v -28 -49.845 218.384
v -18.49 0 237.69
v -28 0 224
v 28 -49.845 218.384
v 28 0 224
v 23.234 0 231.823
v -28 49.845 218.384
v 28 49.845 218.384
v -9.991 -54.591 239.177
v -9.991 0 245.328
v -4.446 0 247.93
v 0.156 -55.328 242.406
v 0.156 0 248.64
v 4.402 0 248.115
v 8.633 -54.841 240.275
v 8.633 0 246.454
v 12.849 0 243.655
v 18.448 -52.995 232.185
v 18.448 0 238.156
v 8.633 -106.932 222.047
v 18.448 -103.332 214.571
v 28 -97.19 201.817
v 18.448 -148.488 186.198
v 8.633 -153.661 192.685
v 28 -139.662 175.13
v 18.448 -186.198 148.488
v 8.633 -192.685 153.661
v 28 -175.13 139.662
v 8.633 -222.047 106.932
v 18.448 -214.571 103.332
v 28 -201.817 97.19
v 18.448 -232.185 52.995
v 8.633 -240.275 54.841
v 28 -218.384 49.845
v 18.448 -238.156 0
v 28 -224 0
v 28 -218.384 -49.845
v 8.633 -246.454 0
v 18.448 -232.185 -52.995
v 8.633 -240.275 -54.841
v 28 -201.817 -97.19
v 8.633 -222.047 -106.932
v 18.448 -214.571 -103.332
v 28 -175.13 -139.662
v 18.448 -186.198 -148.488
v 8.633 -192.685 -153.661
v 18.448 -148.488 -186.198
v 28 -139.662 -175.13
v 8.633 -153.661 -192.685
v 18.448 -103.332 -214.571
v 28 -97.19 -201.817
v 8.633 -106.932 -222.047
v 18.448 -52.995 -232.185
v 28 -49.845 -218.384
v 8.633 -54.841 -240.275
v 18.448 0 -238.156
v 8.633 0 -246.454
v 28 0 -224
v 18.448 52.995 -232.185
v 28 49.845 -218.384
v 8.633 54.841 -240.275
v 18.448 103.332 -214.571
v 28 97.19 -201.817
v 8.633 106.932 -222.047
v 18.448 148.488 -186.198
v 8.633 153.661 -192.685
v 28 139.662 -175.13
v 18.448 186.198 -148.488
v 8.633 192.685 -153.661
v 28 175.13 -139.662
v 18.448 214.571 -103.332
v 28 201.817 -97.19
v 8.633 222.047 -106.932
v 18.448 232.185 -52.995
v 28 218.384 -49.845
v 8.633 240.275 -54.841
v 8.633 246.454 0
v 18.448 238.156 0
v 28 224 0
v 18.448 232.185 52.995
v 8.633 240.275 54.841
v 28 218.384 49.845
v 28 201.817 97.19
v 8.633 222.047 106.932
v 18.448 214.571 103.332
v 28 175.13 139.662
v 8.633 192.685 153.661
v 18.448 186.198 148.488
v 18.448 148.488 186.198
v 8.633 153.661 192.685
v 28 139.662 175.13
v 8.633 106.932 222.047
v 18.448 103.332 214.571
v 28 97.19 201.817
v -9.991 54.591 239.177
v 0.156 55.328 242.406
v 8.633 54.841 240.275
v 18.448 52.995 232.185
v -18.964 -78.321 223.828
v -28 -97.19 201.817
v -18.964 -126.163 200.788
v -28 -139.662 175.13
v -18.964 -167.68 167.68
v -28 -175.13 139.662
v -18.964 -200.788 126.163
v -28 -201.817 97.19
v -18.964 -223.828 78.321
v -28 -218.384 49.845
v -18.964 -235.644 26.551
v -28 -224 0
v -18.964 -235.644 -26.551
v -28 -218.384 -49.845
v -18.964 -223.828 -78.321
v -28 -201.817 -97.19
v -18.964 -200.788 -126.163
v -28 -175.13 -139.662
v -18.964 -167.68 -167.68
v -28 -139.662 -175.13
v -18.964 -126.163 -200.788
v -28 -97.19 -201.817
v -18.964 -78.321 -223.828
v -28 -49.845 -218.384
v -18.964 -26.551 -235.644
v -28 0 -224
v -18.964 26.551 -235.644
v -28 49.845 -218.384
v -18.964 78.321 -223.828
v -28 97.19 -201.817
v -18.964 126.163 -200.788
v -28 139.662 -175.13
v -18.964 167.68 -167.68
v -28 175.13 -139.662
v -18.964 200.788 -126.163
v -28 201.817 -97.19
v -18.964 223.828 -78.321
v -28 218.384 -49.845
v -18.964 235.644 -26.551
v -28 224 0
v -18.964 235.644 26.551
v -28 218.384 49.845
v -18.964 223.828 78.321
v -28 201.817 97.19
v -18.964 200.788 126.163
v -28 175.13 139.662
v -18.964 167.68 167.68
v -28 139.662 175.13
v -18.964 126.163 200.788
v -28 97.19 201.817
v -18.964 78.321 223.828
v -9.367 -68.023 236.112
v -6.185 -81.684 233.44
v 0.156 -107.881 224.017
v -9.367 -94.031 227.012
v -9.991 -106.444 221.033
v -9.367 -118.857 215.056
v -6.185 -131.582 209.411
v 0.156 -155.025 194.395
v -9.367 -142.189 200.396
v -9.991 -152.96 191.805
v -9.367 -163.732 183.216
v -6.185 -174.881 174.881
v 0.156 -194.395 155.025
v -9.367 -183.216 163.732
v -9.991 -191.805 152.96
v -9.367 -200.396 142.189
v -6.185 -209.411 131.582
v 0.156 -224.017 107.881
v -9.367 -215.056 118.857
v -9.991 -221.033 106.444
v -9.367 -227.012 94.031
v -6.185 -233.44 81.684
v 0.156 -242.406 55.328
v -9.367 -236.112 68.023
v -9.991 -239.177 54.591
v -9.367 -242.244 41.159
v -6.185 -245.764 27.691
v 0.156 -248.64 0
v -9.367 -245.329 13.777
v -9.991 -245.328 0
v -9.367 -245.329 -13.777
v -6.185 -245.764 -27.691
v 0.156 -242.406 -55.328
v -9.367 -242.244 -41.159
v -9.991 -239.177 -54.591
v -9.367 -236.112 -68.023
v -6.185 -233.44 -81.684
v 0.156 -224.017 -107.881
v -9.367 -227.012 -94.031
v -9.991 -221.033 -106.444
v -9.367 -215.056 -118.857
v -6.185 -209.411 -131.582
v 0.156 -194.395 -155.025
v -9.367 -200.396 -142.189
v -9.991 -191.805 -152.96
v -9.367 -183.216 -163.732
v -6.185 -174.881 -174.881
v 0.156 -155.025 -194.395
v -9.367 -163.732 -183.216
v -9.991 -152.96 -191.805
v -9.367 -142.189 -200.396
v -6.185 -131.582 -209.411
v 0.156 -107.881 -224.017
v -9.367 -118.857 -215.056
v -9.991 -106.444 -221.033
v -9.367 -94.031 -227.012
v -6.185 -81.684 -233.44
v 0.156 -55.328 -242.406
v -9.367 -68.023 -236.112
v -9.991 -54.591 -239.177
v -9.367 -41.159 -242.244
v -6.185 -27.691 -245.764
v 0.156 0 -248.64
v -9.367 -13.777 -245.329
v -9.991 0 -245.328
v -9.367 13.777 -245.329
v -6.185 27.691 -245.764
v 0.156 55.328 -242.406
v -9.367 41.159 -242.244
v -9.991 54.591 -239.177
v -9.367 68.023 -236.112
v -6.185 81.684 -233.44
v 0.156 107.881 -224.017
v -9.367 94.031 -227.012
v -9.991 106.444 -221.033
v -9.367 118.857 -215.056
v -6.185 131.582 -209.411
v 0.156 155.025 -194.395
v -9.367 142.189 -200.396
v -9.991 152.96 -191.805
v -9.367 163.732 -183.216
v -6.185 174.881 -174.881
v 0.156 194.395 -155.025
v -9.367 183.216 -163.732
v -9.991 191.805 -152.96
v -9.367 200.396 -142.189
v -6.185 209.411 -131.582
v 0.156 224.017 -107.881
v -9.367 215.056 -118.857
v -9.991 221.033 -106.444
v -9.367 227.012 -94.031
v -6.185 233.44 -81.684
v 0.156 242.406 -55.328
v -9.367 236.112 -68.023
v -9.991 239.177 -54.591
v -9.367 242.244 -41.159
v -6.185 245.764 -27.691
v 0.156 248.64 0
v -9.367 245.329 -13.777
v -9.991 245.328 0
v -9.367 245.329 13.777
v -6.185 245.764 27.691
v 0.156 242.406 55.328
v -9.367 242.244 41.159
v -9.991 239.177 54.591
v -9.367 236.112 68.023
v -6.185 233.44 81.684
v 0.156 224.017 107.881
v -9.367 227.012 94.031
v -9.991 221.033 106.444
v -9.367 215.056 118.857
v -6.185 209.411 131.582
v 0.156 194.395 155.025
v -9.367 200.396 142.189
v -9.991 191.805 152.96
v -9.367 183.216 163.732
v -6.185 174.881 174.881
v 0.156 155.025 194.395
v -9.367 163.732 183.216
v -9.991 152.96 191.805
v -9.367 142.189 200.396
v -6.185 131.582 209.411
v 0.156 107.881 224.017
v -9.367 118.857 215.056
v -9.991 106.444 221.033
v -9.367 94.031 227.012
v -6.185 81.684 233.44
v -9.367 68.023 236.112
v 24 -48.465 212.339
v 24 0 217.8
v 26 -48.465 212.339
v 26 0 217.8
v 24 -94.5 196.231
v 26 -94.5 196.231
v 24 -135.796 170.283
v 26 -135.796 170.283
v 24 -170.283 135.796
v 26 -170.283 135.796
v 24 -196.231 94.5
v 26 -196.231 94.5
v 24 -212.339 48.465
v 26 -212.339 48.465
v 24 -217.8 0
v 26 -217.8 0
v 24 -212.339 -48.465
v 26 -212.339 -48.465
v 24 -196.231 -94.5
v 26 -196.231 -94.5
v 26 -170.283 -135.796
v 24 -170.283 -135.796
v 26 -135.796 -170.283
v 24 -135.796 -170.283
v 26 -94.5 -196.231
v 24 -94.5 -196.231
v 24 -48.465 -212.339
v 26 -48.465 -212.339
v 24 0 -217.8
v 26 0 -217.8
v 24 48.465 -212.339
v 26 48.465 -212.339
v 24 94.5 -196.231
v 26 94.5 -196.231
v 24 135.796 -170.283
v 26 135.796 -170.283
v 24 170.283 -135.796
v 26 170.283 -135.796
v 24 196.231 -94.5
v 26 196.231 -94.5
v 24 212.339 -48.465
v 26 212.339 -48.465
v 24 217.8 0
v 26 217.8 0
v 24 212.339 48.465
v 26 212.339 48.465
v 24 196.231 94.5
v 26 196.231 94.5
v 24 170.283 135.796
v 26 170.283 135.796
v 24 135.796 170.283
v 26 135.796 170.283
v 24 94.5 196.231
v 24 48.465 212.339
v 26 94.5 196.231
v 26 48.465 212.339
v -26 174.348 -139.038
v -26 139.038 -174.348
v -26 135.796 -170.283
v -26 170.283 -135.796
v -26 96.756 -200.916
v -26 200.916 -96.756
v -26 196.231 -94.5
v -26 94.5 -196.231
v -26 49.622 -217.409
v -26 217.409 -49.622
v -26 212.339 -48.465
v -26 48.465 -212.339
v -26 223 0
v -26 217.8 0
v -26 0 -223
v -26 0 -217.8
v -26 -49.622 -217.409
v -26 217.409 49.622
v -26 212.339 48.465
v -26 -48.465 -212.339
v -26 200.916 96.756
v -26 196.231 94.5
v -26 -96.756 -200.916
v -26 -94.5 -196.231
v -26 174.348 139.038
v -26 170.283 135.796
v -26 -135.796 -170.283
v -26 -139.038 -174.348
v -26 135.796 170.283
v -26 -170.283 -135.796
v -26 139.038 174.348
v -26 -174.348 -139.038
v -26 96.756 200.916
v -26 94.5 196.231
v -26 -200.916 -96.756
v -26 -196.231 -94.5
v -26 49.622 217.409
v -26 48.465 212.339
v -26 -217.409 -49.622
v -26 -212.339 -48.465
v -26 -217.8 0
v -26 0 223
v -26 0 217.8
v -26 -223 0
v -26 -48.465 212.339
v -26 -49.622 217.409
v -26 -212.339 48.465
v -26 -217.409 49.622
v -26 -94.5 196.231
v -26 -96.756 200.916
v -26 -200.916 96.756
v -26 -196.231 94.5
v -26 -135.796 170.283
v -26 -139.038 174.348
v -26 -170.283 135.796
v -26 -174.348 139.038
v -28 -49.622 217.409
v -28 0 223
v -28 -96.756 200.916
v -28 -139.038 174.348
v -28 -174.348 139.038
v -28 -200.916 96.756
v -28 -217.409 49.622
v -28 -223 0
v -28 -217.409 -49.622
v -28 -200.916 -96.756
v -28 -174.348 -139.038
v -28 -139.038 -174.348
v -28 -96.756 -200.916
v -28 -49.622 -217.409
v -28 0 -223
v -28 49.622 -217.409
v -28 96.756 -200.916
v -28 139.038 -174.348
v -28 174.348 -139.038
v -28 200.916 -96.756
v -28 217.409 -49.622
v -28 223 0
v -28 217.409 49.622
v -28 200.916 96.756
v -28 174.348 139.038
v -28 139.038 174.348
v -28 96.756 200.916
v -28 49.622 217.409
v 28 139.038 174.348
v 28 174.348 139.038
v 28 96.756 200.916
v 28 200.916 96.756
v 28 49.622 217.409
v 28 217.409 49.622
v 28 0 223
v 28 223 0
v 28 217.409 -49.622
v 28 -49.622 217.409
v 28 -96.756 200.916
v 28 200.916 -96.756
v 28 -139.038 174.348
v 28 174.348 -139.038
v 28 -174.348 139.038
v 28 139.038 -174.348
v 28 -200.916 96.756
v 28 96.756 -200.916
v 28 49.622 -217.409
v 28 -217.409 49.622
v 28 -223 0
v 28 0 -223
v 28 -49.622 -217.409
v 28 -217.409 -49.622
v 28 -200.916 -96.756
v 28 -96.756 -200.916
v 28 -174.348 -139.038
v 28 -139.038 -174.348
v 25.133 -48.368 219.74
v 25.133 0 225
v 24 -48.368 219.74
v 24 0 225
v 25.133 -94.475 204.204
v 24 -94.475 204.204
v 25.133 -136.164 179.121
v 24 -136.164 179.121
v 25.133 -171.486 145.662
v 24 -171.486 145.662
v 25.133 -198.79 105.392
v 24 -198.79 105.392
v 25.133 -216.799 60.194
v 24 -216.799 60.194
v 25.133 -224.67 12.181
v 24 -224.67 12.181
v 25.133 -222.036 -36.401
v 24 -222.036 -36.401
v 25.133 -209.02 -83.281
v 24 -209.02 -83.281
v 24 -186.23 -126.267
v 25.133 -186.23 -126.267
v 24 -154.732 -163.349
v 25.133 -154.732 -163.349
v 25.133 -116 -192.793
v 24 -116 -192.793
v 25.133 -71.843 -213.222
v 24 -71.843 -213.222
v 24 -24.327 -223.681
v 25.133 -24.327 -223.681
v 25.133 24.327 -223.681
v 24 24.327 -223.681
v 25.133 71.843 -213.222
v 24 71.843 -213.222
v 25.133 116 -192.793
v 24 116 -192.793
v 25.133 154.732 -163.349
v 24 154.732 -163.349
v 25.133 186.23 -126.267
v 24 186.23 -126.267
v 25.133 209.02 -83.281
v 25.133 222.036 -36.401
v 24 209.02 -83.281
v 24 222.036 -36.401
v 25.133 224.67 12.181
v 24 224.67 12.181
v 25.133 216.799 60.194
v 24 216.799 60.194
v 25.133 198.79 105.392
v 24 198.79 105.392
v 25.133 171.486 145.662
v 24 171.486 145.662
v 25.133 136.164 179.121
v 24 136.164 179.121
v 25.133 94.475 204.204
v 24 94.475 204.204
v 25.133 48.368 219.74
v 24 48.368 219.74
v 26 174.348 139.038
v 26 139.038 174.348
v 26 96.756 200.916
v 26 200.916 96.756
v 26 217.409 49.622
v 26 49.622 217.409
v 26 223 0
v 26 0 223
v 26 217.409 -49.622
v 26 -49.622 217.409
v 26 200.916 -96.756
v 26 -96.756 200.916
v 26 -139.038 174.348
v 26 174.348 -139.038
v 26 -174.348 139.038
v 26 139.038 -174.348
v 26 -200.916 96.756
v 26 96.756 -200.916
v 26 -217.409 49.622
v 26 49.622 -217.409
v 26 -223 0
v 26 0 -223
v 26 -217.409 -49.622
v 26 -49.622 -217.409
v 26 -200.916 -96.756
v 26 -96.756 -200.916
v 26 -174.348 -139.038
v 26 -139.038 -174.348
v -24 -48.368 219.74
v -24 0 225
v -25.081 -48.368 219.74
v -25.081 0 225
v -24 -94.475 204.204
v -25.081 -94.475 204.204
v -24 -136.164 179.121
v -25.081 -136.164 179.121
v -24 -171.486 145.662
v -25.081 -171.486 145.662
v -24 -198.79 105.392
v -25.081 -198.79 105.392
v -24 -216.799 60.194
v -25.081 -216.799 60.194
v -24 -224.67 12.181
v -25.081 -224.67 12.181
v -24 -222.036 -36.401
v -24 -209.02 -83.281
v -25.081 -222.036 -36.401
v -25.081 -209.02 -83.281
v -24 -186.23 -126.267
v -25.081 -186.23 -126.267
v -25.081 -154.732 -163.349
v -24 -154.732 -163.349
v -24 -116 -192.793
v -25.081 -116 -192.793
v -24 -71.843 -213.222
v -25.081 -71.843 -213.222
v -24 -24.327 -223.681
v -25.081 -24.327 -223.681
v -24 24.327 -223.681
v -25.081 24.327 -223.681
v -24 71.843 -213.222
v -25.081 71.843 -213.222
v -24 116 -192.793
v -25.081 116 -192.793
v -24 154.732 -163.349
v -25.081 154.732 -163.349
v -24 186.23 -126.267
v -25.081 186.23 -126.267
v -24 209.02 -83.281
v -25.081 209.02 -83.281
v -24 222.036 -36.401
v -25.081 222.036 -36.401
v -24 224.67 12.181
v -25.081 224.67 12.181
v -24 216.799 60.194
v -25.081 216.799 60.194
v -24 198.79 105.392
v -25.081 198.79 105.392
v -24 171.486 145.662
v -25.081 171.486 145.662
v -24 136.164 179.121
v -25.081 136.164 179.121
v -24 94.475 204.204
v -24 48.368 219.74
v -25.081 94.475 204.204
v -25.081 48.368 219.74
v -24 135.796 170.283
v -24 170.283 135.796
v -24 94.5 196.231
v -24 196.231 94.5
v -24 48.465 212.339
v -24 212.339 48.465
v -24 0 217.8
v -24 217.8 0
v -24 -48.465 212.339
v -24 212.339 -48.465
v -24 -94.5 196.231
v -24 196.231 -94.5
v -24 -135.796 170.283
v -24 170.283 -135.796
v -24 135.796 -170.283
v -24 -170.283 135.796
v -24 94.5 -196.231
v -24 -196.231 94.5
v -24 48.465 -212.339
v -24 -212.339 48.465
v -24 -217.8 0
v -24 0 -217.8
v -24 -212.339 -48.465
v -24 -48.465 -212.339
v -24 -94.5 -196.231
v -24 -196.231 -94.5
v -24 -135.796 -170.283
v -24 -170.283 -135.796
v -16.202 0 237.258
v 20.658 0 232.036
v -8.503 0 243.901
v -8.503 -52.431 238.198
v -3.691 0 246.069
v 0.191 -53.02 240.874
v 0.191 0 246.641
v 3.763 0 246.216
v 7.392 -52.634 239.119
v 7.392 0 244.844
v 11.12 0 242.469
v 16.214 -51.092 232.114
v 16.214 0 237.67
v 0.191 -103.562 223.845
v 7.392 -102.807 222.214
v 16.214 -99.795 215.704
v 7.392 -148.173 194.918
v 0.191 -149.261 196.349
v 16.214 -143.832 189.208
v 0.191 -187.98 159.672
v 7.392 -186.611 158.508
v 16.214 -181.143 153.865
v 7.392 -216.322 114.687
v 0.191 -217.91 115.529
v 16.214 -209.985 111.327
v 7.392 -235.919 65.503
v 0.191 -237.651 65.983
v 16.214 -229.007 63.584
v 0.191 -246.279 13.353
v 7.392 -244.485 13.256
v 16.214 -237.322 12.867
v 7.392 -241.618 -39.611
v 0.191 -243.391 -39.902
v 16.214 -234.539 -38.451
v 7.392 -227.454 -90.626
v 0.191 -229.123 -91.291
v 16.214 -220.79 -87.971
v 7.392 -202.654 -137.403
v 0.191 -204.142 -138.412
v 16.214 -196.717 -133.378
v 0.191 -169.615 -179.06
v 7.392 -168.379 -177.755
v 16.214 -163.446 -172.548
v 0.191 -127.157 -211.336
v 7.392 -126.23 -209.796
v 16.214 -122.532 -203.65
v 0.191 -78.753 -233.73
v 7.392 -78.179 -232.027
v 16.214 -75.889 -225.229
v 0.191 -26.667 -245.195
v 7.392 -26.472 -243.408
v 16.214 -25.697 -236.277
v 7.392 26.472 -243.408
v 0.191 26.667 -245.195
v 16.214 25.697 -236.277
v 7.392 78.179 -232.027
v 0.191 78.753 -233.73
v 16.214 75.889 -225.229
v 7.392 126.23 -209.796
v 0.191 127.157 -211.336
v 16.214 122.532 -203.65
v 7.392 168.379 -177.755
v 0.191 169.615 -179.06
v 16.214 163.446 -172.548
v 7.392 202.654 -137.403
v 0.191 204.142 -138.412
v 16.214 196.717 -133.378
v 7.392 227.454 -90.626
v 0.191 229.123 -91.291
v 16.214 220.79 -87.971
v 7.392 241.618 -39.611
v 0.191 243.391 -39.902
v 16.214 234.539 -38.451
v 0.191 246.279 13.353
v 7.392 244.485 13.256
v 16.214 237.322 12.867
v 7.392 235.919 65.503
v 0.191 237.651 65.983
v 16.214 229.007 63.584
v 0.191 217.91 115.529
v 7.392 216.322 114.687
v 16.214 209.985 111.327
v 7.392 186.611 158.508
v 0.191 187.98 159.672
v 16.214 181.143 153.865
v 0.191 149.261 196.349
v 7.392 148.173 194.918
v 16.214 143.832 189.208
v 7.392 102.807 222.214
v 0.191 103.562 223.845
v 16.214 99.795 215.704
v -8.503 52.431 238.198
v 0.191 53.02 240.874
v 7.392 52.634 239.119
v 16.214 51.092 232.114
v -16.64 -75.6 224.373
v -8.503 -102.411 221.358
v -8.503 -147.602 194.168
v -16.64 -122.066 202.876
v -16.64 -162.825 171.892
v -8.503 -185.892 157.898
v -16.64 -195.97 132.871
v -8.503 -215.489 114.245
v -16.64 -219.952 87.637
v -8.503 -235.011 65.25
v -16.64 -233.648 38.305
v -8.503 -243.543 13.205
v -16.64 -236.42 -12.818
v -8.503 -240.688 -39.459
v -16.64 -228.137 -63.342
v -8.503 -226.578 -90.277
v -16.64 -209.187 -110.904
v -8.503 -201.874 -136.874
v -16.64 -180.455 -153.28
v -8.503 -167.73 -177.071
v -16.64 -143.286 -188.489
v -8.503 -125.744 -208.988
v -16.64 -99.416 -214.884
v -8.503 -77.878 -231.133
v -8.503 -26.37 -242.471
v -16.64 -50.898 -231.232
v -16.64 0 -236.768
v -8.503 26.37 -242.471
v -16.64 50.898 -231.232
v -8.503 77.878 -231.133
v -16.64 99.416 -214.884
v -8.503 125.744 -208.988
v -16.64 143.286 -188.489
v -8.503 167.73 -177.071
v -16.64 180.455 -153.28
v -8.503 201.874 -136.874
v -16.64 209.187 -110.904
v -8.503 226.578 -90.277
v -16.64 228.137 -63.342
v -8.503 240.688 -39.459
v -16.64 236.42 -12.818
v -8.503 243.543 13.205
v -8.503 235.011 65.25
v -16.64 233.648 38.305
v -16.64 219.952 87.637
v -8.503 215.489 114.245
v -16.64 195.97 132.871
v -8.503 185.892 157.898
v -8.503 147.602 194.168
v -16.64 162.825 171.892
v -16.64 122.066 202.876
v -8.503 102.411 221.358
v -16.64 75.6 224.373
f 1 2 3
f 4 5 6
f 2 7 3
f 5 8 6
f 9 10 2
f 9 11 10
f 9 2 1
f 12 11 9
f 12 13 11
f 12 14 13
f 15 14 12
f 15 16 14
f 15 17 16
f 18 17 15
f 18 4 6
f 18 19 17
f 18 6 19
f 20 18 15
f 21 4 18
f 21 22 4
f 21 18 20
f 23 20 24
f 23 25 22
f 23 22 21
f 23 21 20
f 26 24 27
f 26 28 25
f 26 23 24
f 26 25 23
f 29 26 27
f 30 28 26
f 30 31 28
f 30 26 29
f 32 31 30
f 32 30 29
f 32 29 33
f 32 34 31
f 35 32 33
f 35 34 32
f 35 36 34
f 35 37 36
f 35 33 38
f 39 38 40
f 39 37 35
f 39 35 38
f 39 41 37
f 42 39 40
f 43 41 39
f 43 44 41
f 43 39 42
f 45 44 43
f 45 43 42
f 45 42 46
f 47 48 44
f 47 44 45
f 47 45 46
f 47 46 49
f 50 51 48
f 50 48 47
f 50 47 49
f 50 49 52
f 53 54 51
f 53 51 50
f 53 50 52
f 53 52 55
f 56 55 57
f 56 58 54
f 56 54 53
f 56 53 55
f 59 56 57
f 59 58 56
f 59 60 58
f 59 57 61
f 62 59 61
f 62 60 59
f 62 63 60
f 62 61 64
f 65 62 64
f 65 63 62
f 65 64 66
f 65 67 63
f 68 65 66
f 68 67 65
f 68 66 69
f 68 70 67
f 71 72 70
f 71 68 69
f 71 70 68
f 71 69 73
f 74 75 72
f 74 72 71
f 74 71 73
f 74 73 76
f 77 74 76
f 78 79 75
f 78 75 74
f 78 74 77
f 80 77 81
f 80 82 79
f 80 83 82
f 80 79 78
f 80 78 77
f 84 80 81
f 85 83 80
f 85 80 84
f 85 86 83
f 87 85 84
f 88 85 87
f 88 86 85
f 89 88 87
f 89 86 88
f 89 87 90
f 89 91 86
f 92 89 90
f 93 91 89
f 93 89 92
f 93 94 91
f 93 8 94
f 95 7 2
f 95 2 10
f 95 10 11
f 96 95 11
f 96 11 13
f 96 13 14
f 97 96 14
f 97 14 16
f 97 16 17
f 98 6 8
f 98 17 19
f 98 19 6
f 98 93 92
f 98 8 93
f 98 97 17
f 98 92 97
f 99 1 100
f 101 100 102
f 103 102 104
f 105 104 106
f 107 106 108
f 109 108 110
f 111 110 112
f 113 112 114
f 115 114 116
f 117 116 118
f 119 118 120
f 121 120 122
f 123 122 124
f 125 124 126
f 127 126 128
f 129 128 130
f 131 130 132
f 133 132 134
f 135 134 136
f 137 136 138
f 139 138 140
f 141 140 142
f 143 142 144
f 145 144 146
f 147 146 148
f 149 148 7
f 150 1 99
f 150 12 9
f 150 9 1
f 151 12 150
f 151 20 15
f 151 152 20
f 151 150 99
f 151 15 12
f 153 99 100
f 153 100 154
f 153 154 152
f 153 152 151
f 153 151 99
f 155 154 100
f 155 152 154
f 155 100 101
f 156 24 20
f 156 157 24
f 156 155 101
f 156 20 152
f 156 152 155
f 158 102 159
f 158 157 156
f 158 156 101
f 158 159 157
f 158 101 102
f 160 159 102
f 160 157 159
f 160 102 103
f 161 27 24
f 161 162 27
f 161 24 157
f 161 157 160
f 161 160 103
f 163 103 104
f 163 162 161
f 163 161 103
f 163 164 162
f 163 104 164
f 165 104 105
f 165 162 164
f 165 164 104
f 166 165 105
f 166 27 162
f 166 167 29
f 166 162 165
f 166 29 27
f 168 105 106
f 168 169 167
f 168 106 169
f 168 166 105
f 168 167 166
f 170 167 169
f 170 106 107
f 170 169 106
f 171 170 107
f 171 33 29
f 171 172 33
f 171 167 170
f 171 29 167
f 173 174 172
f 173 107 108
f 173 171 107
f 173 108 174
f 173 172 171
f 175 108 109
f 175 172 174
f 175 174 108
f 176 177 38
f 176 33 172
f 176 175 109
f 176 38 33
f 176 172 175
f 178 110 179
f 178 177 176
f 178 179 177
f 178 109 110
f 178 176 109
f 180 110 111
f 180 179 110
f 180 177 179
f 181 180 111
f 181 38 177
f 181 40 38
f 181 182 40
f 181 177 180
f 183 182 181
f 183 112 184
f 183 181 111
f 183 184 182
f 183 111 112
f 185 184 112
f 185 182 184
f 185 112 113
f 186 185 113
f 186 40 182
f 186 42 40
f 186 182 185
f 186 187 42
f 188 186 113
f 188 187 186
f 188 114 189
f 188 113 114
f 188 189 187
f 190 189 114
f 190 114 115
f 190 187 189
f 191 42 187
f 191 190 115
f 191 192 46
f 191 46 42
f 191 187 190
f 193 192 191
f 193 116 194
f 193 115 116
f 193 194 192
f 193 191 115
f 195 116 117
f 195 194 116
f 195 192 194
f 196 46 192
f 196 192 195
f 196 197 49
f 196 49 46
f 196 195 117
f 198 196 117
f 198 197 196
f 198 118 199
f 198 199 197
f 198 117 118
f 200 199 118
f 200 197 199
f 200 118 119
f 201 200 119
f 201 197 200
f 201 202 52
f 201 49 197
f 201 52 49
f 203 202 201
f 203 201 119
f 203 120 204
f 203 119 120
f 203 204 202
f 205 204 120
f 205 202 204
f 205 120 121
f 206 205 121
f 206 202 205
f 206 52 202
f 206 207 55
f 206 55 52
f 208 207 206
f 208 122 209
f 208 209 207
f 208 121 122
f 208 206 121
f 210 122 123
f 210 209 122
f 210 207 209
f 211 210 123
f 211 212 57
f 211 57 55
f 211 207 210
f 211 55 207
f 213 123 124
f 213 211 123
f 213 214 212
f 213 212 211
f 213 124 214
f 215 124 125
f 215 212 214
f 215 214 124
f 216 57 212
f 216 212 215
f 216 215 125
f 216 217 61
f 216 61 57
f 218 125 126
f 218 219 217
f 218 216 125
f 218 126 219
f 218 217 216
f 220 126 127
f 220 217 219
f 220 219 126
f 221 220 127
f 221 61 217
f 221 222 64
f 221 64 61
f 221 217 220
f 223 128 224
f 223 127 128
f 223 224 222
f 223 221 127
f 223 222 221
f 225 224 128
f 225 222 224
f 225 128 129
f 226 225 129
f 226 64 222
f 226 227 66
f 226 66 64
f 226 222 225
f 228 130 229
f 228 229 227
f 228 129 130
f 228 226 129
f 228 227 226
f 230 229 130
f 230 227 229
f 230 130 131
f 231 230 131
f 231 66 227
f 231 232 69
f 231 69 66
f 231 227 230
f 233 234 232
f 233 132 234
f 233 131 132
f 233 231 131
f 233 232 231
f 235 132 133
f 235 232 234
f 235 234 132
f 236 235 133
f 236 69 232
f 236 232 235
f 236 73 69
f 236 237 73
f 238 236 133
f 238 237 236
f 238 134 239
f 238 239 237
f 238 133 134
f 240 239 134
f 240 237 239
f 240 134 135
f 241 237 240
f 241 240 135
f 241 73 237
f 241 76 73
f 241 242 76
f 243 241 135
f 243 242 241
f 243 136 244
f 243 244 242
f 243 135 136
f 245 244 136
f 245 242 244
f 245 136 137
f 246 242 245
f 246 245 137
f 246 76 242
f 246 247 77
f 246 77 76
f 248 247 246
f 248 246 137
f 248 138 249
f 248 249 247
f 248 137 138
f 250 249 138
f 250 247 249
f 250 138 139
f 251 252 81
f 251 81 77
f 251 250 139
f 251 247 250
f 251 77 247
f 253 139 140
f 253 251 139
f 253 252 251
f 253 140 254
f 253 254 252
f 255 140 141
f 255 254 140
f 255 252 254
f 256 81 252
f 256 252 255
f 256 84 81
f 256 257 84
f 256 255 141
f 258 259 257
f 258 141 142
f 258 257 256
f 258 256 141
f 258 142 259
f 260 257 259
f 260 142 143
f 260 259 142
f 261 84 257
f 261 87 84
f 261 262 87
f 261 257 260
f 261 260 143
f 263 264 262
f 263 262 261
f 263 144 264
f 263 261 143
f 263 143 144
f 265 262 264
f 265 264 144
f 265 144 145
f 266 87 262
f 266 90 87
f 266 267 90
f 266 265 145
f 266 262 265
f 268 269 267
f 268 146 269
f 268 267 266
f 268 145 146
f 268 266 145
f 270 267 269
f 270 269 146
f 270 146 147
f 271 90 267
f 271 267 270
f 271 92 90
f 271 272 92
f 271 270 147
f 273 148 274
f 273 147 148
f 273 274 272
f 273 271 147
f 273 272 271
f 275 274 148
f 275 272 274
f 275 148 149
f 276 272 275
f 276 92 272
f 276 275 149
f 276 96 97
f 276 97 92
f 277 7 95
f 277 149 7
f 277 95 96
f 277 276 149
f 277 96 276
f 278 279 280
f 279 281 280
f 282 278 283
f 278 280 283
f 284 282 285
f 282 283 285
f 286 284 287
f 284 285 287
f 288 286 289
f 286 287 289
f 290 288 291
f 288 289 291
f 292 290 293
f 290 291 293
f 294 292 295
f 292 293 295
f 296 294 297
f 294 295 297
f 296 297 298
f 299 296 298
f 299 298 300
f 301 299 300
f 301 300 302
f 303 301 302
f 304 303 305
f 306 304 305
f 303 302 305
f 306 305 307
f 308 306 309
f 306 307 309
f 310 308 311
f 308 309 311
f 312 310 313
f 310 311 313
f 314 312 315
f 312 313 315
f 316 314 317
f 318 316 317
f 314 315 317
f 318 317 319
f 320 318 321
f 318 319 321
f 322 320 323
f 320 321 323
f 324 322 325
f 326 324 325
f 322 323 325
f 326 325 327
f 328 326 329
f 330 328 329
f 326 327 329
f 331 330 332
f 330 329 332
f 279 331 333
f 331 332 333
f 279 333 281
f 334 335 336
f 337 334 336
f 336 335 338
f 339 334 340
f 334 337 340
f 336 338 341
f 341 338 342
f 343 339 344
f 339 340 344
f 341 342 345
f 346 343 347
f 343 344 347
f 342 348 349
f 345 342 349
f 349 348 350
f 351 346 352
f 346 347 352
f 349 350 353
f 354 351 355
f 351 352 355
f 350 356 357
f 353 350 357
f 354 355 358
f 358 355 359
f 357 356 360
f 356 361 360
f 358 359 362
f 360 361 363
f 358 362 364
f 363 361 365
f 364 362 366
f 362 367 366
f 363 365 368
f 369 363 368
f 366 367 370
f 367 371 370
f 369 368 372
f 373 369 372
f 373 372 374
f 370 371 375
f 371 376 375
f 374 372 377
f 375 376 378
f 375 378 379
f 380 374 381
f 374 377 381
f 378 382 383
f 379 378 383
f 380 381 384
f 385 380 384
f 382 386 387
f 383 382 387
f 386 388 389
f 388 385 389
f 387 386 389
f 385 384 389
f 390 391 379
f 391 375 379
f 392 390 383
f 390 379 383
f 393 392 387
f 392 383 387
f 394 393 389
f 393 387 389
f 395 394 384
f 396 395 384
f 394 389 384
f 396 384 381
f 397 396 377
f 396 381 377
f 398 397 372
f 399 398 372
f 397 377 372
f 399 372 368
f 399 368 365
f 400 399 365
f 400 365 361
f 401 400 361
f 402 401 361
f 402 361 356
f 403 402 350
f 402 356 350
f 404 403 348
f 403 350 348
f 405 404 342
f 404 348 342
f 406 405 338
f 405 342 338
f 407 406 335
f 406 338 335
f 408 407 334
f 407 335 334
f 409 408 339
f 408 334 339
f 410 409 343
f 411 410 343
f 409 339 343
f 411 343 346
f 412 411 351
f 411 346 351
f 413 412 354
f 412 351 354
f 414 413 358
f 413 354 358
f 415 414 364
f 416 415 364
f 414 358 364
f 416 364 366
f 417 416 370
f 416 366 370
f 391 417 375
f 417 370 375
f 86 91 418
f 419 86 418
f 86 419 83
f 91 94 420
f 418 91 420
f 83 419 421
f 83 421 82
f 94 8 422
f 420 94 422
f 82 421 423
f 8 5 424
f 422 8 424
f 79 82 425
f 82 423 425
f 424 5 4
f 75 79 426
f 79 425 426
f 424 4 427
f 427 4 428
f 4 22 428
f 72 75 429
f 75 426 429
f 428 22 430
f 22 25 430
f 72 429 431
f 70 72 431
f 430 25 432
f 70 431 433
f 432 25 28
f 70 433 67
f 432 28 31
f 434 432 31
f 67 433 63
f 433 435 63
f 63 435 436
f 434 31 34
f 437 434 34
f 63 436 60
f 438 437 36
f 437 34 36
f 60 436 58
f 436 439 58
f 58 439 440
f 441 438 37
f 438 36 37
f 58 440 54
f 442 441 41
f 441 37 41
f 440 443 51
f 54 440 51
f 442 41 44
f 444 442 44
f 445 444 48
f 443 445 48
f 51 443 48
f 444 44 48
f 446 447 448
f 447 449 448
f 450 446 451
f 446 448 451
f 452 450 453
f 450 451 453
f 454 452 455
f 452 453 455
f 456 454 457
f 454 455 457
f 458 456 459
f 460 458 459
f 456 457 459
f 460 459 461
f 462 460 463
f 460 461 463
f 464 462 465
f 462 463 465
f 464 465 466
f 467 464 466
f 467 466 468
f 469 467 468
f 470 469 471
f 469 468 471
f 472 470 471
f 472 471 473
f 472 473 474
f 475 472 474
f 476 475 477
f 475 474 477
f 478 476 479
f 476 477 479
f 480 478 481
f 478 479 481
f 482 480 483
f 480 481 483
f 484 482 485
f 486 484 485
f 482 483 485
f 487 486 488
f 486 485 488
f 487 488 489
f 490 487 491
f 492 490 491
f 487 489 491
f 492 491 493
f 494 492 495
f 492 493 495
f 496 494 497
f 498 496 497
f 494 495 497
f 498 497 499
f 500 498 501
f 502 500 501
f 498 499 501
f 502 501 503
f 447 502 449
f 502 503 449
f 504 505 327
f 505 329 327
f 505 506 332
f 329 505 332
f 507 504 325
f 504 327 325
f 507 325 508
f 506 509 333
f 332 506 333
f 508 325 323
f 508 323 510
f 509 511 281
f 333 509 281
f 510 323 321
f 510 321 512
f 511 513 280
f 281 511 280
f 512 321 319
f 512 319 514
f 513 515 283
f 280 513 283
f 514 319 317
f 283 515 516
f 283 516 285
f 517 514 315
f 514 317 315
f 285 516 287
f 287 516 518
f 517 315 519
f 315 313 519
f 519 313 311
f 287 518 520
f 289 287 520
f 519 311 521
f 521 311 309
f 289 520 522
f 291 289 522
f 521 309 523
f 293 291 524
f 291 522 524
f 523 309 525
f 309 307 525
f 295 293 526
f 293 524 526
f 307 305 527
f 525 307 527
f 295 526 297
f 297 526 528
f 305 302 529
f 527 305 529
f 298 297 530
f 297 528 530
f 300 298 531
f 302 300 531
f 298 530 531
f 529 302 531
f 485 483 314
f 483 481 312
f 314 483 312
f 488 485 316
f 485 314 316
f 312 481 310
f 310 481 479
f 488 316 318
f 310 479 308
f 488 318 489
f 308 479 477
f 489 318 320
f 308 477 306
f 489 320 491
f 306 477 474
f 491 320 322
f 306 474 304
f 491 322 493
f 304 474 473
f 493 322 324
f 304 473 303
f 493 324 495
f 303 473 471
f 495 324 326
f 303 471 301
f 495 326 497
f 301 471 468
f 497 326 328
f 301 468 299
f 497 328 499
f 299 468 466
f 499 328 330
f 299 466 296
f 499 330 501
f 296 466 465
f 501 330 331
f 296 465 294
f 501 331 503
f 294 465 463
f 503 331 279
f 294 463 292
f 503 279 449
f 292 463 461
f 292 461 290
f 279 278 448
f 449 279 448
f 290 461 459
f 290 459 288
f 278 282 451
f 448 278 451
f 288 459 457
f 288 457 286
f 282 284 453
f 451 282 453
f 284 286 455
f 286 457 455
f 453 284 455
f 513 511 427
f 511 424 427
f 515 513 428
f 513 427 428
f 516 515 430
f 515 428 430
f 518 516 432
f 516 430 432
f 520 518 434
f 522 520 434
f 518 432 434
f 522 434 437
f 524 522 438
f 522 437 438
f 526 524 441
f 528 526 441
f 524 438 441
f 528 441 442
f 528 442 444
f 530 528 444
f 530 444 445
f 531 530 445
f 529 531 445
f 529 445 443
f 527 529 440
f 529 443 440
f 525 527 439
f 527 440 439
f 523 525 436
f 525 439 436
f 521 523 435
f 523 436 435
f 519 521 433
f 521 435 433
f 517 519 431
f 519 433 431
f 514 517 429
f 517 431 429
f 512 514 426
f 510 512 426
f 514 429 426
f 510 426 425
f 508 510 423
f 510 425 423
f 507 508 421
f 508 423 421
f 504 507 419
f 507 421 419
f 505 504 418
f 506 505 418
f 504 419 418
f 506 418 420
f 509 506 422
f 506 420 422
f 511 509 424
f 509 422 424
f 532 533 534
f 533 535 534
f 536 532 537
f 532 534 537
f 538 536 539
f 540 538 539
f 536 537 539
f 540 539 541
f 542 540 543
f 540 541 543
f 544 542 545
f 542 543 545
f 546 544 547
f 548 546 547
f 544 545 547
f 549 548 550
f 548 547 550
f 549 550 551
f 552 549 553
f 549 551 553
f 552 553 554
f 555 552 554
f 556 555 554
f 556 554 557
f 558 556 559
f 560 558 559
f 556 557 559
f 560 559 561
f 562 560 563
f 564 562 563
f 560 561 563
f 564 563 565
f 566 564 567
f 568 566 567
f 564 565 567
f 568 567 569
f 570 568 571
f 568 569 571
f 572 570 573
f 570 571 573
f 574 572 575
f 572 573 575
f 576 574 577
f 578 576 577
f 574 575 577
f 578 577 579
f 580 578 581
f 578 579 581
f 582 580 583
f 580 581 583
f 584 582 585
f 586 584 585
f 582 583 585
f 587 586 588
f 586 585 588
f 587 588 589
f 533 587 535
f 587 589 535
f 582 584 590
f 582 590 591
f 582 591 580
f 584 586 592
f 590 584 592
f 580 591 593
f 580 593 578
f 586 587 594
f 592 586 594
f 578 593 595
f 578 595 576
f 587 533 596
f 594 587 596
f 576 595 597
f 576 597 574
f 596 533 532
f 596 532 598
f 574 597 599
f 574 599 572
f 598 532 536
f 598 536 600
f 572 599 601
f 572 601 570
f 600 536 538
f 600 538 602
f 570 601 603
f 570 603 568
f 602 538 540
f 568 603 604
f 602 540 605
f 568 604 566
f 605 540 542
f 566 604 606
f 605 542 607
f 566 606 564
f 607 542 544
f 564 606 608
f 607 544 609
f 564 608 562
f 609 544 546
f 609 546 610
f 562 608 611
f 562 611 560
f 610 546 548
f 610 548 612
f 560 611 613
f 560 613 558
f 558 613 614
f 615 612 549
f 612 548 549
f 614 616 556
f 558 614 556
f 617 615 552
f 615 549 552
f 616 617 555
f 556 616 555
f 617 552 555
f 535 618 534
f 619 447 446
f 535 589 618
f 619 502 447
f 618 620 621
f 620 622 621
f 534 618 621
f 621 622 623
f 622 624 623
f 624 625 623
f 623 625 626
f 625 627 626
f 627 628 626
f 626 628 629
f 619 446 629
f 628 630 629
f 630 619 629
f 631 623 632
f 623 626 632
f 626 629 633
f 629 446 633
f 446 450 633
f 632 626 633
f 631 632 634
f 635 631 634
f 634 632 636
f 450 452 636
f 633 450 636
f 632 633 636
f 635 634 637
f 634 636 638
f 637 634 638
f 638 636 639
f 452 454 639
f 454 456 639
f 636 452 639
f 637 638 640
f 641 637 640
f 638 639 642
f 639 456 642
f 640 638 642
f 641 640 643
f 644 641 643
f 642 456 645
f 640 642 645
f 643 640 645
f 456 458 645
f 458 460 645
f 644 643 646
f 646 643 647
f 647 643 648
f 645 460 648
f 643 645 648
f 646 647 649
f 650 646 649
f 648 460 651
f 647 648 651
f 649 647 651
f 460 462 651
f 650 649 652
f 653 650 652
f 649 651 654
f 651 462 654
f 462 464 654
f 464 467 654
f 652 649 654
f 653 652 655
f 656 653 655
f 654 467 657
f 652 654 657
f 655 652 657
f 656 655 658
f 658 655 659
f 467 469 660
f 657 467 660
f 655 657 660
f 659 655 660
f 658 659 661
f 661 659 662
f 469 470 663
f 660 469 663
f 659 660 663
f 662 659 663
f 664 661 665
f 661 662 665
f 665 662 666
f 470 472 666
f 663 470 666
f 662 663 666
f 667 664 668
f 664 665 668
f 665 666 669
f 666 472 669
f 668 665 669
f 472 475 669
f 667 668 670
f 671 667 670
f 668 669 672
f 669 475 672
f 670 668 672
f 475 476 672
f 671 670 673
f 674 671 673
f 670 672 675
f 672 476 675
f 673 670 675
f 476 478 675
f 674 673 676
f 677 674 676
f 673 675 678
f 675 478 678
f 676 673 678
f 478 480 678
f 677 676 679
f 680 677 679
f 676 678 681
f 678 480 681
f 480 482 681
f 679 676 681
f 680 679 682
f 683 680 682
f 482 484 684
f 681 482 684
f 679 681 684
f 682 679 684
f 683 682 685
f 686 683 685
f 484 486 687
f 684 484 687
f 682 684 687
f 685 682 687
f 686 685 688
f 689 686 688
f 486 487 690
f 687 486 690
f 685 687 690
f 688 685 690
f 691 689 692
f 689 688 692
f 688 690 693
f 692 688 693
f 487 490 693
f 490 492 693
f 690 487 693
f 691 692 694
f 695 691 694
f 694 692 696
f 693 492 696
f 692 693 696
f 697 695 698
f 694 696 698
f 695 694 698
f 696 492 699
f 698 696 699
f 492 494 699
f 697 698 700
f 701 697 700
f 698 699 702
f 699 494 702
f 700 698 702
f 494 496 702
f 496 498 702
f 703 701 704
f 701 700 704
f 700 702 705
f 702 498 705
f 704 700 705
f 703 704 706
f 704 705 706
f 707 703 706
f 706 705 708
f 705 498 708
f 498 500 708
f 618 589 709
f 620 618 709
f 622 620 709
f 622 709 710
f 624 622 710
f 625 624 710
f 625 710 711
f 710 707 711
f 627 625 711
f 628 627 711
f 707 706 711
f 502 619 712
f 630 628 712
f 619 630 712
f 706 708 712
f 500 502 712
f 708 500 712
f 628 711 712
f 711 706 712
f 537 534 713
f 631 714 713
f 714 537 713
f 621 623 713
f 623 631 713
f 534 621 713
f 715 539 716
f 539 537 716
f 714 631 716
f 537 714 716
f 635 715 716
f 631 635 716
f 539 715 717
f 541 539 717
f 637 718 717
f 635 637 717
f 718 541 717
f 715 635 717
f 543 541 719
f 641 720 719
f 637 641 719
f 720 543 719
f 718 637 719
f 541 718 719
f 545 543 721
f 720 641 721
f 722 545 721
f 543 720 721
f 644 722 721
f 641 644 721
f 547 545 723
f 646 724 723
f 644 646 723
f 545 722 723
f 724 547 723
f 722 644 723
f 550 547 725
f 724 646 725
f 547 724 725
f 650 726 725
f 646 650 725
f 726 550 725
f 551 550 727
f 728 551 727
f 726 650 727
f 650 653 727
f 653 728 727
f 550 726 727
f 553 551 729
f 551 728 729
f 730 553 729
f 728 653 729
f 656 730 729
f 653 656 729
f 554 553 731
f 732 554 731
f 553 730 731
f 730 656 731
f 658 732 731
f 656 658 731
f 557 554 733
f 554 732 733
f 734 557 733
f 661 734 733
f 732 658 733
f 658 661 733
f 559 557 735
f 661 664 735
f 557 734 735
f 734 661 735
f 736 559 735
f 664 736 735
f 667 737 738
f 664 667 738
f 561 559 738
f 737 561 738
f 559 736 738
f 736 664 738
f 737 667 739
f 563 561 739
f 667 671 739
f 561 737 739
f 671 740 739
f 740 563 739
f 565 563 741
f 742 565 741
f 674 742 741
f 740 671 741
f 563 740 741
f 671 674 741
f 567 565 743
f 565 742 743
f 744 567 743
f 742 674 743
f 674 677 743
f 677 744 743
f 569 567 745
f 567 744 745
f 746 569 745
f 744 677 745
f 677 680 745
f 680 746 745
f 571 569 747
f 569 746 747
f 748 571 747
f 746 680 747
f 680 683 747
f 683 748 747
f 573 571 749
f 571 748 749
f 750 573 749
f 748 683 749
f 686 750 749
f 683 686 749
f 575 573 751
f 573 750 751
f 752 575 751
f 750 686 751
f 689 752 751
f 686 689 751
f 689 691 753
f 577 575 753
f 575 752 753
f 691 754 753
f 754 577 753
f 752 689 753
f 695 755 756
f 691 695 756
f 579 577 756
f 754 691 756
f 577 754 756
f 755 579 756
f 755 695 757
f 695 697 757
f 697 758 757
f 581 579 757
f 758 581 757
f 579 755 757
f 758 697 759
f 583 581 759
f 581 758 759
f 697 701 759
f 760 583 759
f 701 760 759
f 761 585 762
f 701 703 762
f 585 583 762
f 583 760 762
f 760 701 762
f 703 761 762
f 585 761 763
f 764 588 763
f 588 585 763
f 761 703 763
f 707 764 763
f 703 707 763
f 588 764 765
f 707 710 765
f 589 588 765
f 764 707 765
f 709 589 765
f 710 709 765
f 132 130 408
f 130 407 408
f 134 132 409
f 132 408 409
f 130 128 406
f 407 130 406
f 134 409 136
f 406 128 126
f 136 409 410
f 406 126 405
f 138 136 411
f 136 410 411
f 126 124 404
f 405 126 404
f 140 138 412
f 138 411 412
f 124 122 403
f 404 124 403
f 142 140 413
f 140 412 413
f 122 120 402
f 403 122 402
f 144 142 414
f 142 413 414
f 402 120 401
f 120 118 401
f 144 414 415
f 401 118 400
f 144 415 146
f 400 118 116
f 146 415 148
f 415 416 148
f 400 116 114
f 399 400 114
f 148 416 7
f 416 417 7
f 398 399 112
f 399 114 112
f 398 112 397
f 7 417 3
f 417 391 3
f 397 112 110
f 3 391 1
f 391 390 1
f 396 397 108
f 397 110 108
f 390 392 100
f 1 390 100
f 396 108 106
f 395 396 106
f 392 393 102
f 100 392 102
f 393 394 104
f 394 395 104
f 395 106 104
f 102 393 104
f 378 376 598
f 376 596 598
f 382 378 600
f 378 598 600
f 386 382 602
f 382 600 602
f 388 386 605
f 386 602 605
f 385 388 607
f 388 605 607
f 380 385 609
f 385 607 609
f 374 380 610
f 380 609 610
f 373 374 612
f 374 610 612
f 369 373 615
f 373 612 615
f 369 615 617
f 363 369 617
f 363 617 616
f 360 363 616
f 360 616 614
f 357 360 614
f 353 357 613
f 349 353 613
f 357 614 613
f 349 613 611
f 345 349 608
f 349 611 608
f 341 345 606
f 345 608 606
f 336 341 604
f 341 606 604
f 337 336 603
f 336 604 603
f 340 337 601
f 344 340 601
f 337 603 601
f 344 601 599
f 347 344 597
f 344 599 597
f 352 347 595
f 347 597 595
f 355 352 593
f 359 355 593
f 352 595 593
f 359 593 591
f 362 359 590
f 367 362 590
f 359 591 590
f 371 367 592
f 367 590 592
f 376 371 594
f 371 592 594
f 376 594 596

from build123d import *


with BuildPart() as part:
    # Sketch2 → Revolve2 (revolve)
    with BuildSketch(Plane.XY, mode=Mode.PRIVATE) as revolve2_sk:
        with BuildLine():
            Line((28, 223), (28, 224))
            add(Edge.make_bspline(
                [(-28, 224), (0.637105464, 273.282336613), (28, 224)],
                knots=[0, 0, 0, 1, 1, 1], degree=2))
            Line((-28, 224), (-28, 223))
            Line((-28, 223), (-26, 223))
            Line((-26, 223), (-26, 217.8))
            Line((-26, 217.8), (-24, 217.8))
            Line((-24, 217.8), (-24, 225))
            Line((-24, 225), (-25.081218575, 225))
            add(Edge.make_bspline(
                [(-25.081218575, 225), (-24.803751608, 225.45777092), (-24.237614436, 226.377618943), (-23.119772806, 228.136935628), (-21.72253005, 230.230207133), (-20.055318011, 232.558380785), (-17.843342422, 235.422340199), (-15.103291285, 238.549071728), (-11.866641202, 241.577463879), (-8.697647985, 243.88853238), (-4.578991313, 246.034494913), (0.334957233, 247.047411067), (5.210258098, 246.029099892), (9.261140781, 243.884708593), (12.362605587, 241.575555693), (15.515071363, 238.548885253), (18.1707605, 235.422942751), (20.306490742, 232.559178115), (21.912117195, 230.230947024), (23.254272667, 228.137440008), (24.32591937, 226.37789186), (24.867994621, 225.457809999), (25.133447636, 225)],
                knots=[0.021109035, 0.021109035, 0.021109035, 0.021109035, 0.036079914, 0.051050794, 0.080992554, 0.110934313, 0.140876073, 0.200759592, 0.260643111, 0.32052663, 0.380410149, 0.500177187, 0.619944225, 0.679827744, 0.739711263, 0.799594782, 0.859478301, 0.889420061, 0.91936182, 0.94930358, 0.96427446, 0.979245339, 0.979245339, 0.979245339, 0.979245339], degree=3))
            Line((25.133447636, 225), (24, 225))
            Line((24, 225), (24, 217.8))
            Line((24, 217.8), (26, 217.8))
            Line((26, 217.8), (26, 223))
            Line((26, 223), (28, 223))
        make_face()
    revolve(revolve2_sk.sketch.rotate(Axis((-92.729883755, 0, 0), (1, 0, 0)), 90), axis=Axis((-92.729883755, 0, 0), (1, 0, 0)))


solid = part.part
